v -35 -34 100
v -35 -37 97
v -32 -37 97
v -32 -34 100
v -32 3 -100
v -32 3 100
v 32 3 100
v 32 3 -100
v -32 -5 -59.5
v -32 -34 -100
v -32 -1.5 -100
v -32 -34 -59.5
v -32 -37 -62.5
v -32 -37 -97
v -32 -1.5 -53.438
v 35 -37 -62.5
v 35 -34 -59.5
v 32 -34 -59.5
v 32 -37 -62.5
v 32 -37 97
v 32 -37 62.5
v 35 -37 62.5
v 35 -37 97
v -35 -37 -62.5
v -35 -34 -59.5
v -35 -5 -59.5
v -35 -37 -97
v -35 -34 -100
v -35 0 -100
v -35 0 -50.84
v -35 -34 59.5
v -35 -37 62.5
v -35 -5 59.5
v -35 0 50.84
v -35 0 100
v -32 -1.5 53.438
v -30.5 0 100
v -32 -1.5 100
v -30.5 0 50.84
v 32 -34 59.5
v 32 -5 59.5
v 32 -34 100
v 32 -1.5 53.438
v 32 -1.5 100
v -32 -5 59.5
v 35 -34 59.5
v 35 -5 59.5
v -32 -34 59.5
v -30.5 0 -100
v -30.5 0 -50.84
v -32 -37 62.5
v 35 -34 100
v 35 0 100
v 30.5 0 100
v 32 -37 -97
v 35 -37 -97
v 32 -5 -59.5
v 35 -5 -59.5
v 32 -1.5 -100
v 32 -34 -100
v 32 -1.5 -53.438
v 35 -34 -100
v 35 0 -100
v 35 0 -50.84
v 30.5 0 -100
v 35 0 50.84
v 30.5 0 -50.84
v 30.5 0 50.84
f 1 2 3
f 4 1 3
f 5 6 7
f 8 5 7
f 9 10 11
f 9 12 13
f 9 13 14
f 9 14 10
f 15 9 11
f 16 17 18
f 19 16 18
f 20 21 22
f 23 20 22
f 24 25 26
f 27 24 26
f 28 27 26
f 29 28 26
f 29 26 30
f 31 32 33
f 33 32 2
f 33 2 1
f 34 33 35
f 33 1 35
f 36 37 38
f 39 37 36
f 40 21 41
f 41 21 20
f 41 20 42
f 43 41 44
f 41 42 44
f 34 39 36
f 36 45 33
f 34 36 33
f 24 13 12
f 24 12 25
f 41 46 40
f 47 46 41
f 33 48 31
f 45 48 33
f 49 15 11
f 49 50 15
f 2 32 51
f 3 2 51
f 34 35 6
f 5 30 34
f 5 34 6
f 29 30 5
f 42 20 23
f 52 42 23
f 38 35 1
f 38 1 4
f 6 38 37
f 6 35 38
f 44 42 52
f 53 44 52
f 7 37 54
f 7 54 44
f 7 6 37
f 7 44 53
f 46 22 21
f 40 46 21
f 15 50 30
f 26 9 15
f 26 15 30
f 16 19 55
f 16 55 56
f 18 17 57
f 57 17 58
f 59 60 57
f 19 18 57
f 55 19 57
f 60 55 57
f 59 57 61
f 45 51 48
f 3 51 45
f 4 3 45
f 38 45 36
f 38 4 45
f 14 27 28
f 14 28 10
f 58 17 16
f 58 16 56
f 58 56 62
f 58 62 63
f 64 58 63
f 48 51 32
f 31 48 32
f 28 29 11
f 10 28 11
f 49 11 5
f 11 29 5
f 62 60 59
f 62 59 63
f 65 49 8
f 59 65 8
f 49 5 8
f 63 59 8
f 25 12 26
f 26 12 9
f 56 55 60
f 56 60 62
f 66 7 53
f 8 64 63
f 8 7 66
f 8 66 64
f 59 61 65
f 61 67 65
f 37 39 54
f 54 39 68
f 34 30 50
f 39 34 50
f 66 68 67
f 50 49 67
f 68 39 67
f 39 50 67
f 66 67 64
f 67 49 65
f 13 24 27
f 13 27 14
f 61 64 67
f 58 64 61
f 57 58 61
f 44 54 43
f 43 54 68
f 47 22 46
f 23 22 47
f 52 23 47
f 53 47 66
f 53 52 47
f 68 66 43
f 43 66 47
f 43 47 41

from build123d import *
from OCP.BRepFilletAPI import BRepFilletAPI_MakeChamfer

# Parameters (mm, degrees)
SKETCH2_W           = 64
SKETCH2_H           = 200
BOSS_EXTRUDE1_DEPTH = 3
SKETCH13_W          = 3
SKETCH13_H          = 40
BOSS_EXTRUDE2_DEPTH = 200
CHAMFER1_SIZE       = 1.5
CHAMFER2_SIZE       = 3
CUT_EXTRUDE1_REACH  = 129.55
SKETCH14_W          = 119
SKETCH14_H          = 37
CHAMFER3_SIZE       = 8.660254038
CHAMFER3_SIZE_2     = 5
CHAMFER4_SIZE       = 3


with BuildPart() as part:
    # Sketch2 → Boss-Extrude1 (new body)
    with BuildSketch(Plane(origin=(0, 0, 0), x_dir=(1, 0, 0), z_dir=(0, 1, 0))):
        Rectangle(SKETCH2_W, SKETCH2_H)
    extrude(amount=BOSS_EXTRUDE1_DEPTH)

    # Sketch13 → Boss-Extrude2 (add)
    with BuildSketch(Plane.XY.offset(100)):
        with Locations((33.5, -17)):
            Rectangle(SKETCH13_W, SKETCH13_H)
        with Locations((-33.5, -17)):
            Rectangle(SKETCH13_W, SKETCH13_H)
    extrude(amount=-BOSS_EXTRUDE2_DEPTH)

    # Chamfer1
    chamfer1_edges = [part.edges().sort_by_distance(p)[0] for p in [
        (-32, 0, 0),
        (32, 0, 0),
    ]]
    chamfer(chamfer1_edges, length=CHAMFER1_SIZE)

    # Chamfer2
    chamfer2_edges = [part.edges().sort_by_distance(p)[0] for p in [
        (35, 3, 0),
        (-35, 3, 0),
    ]]
    chamfer(chamfer2_edges, length=CHAMFER2_SIZE)

    # Cut-Extrude1: up to this face of the body (flat: up to its plane)
    cut_extrude1_end = Plane(part.part.faces().sort_by_distance((-35, -18.5, 0))[0])
    # Sketch14 → Cut-Extrude1 (cut, up to the picked face)
    with BuildSketch(Plane(origin=(35, 0, 0), x_dir=(0, 0, -1), z_dir=(1, 0, 0)), mode=Mode.PRIVATE) as cut_extrude1_sk1:
        with Locations((0, -18.5)):
            Rectangle(SKETCH14_W, SKETCH14_H)
    cut_extrude1_tool1 = split(extrude(cut_extrude1_sk1.sketch, amount=-CUT_EXTRUDE1_REACH, mode=Mode.PRIVATE), bisect_by=cut_extrude1_end, keep=Keep.BOTH, mode=Mode.PRIVATE)
    add(cut_extrude1_tool1.solids().sort_by(Axis((35, -18.5, 0), (-1, 0, 0)))[0], mode=Mode.SUBTRACT)

    # Chamfer3
    chamfer3_edges_1 = [part.edges().sort_by_distance(p)[0] for p in [
        (32.75, 0, -59.5),
    ]]
    chamfer3_side_1 = [part.faces().sort_by_distance(p)[0] for p in [
        (32.75, 0, -59.4),
    ]]
    chamfer3_edges_2 = [part.edges().sort_by_distance(p)[0] for p in [
        (-32.75, 0, -59.5),
    ]]
    chamfer3_side_2 = [part.faces().sort_by_distance(p)[0] for p in [
        (-32.75, 0, -59.4),
    ]]
    chamfer3_edges_3 = [part.edges().sort_by_distance(p)[0] for p in [
        (32.75, 0, 59.5),
    ]]
    chamfer3_side_3 = [part.faces().sort_by_distance(p)[0] for p in [
        (32.75, 0, 59.4),
    ]]
    chamfer3_edges_4 = [part.edges().sort_by_distance(p)[0] for p in [
        (-32.75, 0, 59.5),
    ]]
    chamfer3_side_4 = [part.faces().sort_by_distance(p)[0] for p in [
        (-32.75, 0, 59.4),
    ]]
    chamfer3 = BRepFilletAPI_MakeChamfer(part.part.solid().wrapped)
    for e in chamfer3_edges_1:
        chamfer3.Add(CHAMFER3_SIZE - 0.0001, CHAMFER3_SIZE_2 - 0.0001, e.wrapped, chamfer3_side_1[0].wrapped)
    for e in chamfer3_edges_2:
        chamfer3.Add(CHAMFER3_SIZE - 0.0001, CHAMFER3_SIZE_2 - 0.0001, e.wrapped, chamfer3_side_2[0].wrapped)
    for e in chamfer3_edges_3:
        chamfer3.Add(CHAMFER3_SIZE - 0.0001, CHAMFER3_SIZE_2 - 0.0001, e.wrapped, chamfer3_side_3[0].wrapped)
    for e in chamfer3_edges_4:
        chamfer3.Add(CHAMFER3_SIZE - 0.0001, CHAMFER3_SIZE_2 - 0.0001, e.wrapped, chamfer3_side_4[0].wrapped)
    add(Compound.cast(chamfer3.Shape()), mode=Mode.REPLACE)  # a hair under: the kernel refuses the full size

    # Chamfer4
    chamfer4_edges = [part.edges().sort_by_distance(p)[0] for p in [
        (33.5, -37, 100),
        (33.5, -37, -100),
        (-33.5, -37, 100),
        (-33.5, -37, -100),
        (33.5, -37, -59.5),
        (-33.5, -37, 59.5),
        (-33.5, -37, -59.5),
        (33.5, -37, 59.5),
    ]]
    chamfer(chamfer4_edges, length=CHAMFER4_SIZE)


solid = part.part
